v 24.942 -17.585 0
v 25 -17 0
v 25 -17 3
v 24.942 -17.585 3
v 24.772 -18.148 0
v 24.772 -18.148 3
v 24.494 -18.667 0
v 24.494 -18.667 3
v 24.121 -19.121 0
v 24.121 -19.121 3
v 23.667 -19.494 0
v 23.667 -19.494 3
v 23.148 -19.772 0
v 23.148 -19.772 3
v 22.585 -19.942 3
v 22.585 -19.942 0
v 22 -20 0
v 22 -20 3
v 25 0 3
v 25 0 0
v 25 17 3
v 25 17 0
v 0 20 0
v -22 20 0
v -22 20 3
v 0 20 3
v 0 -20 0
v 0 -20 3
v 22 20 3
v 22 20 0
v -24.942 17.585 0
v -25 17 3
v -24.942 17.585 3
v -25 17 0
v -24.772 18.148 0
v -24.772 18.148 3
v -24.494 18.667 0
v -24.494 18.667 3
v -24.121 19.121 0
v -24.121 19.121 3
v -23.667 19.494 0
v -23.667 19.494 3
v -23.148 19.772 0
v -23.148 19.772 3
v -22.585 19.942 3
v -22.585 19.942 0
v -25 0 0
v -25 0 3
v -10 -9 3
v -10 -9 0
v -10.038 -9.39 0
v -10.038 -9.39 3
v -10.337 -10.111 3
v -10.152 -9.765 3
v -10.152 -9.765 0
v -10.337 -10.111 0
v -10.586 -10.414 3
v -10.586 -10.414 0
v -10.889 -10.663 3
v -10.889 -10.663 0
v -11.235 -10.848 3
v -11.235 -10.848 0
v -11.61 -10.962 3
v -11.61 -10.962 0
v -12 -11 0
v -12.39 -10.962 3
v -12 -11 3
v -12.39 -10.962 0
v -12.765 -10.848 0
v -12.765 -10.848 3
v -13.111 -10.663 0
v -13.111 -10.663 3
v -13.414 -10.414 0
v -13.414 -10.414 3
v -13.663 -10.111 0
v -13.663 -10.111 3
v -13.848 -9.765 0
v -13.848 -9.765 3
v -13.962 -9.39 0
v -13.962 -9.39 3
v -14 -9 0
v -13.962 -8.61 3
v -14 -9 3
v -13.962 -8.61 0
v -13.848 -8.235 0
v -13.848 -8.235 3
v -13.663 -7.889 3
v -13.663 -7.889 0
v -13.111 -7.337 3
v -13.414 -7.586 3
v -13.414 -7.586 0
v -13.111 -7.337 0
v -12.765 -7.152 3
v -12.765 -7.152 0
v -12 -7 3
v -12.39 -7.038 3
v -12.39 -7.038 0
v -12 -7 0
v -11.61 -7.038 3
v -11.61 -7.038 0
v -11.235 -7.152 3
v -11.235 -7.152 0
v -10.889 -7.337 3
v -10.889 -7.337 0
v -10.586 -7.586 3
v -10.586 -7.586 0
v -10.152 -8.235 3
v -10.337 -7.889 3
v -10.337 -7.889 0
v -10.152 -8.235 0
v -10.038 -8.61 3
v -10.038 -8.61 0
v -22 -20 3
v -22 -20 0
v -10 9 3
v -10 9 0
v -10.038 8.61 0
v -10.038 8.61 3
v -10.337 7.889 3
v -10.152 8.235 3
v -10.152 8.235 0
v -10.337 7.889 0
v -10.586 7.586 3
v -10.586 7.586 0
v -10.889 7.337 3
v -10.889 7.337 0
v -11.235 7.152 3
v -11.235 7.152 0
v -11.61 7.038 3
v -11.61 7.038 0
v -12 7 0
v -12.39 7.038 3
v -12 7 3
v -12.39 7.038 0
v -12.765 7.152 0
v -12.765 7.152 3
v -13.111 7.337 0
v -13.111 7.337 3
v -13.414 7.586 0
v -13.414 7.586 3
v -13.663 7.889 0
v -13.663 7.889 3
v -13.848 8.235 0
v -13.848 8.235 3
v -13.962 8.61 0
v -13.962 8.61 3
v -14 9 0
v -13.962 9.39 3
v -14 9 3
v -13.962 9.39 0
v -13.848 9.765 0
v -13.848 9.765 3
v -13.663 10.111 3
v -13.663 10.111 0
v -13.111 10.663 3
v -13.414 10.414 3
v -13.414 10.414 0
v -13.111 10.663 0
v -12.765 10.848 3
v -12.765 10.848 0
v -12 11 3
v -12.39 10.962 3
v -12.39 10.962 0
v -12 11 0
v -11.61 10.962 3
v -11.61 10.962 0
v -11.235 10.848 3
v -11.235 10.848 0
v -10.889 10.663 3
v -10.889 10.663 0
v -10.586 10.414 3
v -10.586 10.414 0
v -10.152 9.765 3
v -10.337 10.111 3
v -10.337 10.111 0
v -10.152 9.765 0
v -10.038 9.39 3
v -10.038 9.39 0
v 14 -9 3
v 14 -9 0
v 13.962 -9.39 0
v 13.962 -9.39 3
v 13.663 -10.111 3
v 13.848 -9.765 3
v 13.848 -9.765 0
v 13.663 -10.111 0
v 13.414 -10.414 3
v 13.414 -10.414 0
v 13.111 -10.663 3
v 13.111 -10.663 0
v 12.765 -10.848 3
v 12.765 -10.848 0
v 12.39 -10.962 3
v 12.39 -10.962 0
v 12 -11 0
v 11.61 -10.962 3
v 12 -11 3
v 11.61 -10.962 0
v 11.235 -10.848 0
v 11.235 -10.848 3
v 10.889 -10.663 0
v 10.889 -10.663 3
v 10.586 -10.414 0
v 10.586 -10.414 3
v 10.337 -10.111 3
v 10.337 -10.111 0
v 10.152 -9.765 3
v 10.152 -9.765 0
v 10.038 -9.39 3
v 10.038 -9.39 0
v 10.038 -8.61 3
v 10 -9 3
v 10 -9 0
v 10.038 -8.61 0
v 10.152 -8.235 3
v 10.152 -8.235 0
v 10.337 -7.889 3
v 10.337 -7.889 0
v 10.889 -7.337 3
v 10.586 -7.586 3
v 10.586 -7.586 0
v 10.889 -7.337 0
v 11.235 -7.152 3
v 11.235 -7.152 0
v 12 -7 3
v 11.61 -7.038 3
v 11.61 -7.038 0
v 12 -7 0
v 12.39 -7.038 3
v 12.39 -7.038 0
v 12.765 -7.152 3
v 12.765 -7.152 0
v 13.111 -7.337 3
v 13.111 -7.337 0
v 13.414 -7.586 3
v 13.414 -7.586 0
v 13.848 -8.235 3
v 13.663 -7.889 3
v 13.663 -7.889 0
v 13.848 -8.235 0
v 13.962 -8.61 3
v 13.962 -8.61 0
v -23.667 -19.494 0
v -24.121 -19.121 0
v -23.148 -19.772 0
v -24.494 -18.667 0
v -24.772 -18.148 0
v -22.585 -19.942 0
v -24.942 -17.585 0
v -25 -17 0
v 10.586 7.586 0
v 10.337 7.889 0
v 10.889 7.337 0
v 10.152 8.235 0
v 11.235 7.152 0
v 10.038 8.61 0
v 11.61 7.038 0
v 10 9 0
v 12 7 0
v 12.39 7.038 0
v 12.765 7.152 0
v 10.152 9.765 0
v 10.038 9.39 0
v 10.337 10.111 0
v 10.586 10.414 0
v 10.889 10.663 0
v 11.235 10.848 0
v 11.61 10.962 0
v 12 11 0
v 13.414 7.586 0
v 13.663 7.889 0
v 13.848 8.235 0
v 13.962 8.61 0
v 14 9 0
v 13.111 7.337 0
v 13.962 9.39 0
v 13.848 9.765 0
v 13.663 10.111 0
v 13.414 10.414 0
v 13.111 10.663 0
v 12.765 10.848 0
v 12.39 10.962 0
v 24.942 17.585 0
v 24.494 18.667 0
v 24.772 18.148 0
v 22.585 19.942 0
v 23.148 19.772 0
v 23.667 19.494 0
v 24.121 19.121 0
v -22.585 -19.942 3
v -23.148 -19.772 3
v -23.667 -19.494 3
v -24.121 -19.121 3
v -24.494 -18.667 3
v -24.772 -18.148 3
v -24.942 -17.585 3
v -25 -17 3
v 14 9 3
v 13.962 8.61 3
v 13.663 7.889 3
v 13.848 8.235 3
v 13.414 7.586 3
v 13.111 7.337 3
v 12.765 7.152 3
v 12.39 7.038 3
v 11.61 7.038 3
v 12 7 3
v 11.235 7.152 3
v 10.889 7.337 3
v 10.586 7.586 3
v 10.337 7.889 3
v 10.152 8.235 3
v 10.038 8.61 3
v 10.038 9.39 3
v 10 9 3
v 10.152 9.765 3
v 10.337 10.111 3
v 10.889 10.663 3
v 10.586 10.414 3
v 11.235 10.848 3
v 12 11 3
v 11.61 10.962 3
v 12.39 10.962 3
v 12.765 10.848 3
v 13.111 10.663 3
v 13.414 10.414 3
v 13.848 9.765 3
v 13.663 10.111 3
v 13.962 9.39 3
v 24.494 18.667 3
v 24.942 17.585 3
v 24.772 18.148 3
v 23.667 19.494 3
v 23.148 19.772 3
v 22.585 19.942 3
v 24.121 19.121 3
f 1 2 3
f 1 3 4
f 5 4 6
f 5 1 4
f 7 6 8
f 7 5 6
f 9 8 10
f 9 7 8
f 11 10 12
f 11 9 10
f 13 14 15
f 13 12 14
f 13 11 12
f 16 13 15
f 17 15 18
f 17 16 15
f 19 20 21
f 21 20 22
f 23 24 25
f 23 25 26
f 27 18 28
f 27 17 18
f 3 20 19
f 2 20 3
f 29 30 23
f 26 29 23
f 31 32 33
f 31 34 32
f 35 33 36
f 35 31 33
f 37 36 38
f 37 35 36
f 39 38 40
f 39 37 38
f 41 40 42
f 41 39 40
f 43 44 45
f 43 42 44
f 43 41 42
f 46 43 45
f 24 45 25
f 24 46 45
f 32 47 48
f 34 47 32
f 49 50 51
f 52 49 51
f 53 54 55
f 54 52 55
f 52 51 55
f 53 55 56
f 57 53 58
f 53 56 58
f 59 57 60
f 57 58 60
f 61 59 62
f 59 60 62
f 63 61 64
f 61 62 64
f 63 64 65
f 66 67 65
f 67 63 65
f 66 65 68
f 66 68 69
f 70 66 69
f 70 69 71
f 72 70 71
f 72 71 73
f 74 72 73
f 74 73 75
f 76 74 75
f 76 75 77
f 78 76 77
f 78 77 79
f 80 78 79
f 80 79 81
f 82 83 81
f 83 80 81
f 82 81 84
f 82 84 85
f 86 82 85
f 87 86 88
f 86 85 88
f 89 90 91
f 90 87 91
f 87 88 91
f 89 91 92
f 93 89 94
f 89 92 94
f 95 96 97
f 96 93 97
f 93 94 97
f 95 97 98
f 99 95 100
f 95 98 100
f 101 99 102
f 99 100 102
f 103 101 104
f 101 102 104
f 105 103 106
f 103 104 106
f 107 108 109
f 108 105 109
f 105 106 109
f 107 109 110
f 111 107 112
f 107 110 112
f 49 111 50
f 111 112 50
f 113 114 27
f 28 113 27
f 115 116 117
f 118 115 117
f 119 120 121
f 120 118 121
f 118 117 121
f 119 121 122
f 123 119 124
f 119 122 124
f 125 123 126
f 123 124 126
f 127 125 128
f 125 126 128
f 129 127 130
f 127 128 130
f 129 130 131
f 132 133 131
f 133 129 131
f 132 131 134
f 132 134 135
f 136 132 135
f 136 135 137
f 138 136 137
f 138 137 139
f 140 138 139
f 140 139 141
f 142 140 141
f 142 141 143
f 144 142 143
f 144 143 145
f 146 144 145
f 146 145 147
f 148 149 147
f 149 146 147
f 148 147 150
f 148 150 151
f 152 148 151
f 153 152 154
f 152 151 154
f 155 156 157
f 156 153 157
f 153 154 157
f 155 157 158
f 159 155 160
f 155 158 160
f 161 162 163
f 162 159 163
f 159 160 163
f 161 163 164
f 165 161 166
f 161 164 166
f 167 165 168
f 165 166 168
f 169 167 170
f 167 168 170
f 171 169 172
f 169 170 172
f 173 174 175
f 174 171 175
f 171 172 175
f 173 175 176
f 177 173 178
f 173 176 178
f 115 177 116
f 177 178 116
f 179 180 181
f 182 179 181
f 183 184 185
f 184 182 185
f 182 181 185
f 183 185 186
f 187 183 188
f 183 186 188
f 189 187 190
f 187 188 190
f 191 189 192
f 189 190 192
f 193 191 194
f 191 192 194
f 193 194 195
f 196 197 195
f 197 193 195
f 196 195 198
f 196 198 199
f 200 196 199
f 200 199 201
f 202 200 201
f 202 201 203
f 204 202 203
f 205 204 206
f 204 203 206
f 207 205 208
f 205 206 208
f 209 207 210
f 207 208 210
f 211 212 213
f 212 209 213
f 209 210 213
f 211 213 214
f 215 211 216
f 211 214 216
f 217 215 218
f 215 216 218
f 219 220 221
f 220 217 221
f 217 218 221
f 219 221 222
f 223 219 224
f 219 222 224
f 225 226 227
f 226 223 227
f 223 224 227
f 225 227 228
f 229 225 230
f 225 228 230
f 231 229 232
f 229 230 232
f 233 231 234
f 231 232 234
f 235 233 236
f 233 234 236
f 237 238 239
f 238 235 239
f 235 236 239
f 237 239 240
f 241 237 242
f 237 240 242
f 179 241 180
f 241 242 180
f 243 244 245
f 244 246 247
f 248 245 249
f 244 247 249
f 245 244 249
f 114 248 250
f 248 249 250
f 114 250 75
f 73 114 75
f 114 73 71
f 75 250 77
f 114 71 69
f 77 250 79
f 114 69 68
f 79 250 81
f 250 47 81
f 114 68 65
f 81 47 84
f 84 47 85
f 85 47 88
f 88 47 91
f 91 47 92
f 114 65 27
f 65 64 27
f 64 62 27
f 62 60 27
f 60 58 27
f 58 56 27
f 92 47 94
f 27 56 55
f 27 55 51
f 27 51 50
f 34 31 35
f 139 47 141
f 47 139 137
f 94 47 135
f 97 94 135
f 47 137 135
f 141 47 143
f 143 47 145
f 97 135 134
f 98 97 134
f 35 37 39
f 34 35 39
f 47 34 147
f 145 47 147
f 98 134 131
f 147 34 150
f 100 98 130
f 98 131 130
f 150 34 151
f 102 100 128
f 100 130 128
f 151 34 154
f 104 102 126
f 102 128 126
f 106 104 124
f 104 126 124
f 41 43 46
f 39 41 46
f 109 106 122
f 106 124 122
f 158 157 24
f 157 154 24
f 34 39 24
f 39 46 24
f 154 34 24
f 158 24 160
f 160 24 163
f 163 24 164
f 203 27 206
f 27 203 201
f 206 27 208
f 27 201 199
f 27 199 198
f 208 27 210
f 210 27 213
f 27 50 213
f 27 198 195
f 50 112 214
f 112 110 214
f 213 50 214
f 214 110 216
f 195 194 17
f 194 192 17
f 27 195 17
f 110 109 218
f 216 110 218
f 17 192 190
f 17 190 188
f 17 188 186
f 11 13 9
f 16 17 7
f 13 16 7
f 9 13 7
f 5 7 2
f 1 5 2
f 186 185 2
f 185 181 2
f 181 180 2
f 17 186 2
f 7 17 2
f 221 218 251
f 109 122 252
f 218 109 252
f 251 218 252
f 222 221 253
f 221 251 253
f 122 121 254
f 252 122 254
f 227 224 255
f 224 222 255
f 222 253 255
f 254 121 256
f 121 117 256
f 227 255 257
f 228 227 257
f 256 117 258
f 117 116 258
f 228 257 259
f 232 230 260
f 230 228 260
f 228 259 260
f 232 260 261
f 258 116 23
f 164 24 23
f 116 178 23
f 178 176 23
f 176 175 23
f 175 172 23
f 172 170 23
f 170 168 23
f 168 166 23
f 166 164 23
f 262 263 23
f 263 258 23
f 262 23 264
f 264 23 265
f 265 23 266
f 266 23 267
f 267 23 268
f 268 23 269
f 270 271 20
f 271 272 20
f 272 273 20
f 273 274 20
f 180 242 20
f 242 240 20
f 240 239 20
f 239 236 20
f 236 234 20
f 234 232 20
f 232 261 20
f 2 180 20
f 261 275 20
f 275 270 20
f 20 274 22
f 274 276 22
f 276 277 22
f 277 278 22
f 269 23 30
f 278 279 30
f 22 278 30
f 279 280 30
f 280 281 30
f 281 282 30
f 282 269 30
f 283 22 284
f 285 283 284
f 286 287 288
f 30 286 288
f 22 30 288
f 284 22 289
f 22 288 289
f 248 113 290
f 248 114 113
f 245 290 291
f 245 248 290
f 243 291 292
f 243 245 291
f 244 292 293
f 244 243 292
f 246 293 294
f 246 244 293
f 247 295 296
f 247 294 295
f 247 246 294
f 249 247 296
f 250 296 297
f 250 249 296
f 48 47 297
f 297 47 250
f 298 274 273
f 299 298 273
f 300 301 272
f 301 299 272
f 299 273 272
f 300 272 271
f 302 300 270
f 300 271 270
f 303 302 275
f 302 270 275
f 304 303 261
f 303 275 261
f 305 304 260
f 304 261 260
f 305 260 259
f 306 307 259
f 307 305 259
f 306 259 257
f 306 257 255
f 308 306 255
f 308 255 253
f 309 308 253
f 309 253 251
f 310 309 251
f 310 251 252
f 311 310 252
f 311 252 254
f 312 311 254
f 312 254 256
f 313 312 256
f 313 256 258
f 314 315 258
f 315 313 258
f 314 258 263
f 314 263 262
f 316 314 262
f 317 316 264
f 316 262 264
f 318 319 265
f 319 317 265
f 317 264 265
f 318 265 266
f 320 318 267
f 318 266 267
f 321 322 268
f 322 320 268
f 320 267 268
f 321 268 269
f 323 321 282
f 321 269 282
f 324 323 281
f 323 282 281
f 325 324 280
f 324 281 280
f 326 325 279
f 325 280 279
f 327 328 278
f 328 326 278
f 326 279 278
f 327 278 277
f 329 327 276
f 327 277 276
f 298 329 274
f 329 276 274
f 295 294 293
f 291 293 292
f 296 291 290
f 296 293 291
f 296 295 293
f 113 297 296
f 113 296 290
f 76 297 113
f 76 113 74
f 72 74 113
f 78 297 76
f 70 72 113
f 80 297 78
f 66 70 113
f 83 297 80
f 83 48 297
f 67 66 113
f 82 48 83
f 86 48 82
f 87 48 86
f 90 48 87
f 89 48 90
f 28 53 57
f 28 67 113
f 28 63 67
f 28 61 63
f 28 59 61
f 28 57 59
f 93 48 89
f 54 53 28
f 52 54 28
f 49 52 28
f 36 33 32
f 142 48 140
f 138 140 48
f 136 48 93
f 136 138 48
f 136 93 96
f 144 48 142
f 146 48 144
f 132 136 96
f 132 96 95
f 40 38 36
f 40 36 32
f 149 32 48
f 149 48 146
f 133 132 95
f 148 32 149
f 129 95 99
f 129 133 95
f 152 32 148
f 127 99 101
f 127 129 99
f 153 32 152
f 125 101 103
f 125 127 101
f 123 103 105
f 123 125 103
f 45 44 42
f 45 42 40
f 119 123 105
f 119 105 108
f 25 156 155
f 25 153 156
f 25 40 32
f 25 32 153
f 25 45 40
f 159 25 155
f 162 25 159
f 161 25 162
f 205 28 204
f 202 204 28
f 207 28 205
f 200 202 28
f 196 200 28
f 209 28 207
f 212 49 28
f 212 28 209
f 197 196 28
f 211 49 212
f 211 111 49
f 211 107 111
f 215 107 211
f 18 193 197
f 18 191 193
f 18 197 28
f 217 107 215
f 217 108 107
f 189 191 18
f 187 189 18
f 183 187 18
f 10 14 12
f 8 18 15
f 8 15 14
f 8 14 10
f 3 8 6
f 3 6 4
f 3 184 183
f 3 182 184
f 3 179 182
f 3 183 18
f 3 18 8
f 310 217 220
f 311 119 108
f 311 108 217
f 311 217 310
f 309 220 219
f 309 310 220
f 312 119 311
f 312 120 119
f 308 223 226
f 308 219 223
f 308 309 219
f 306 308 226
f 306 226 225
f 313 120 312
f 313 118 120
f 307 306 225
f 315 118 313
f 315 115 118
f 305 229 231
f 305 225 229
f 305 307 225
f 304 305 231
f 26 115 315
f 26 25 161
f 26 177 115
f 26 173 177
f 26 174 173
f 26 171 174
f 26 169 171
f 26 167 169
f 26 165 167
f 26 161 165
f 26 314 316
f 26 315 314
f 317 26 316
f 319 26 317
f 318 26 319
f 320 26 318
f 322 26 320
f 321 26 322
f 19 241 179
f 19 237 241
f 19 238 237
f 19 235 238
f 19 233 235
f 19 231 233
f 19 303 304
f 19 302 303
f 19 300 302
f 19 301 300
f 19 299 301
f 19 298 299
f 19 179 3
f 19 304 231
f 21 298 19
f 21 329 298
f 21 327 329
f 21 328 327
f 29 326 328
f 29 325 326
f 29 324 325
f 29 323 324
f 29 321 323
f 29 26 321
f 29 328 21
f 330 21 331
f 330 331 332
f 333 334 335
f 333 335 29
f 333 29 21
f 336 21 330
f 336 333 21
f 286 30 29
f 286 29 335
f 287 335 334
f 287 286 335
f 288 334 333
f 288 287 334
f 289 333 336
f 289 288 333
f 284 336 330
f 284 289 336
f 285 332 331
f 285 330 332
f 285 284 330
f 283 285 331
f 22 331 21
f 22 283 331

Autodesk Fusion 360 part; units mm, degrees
sketch "Sketch1" plane through (0, 0, 0) normal (0, 0, 1) x (1, 0, 0)
  line L0 (0, 0) -> (-25, 0) construction
  line L1 (-25, 0) -> (-25, 17)
  line L2 (-22, 20) -> (0, 20)
  line L3 (0, 20) -> (0, 0) construction
  circle A0 centre (-12, 9) radius 2
  arc A1 (-22, 20) -> (-25, 17) centre (-22, 17) ccw
  circle A2 centre (-12, -9) radius 2
  arc A3 (-25, -17) -> (-22, -20) centre (-22, -17) ccw
  line L4 (-22, -20) -> (0, -20)
  line L5 (-25, 0) -> (-25, -17)
  arc A4 (25, 17) -> (22, 20) centre (22, 17) ccw
  arc A5 (22, -20) -> (25, -17) centre (22, -17) ccw
  line L6 (22, -20) -> (0, -20)
  line L7 (22, 20) -> (0, 20)
  line L8 (25, 0) -> (25, 17)
  circle A6 centre (12, -9) radius 2
  circle A7 centre (12, 9) radius 2
  line L9 (25, 0) -> (25, -17)
  point P0 (-25, 20)
  point P1 (-25, -20)
  point P2 (25, 20)
  point P3 (25, -20)
  dimension "d1" = 20
  dimension "d2" = 25
  dimension "d3" = 12
  dimension "d4" = 9
  dimension "d5" = 4
  dimension "d6" = 3
extrude "Extrude1" add sketch "Sketch1" along normal blind 3
